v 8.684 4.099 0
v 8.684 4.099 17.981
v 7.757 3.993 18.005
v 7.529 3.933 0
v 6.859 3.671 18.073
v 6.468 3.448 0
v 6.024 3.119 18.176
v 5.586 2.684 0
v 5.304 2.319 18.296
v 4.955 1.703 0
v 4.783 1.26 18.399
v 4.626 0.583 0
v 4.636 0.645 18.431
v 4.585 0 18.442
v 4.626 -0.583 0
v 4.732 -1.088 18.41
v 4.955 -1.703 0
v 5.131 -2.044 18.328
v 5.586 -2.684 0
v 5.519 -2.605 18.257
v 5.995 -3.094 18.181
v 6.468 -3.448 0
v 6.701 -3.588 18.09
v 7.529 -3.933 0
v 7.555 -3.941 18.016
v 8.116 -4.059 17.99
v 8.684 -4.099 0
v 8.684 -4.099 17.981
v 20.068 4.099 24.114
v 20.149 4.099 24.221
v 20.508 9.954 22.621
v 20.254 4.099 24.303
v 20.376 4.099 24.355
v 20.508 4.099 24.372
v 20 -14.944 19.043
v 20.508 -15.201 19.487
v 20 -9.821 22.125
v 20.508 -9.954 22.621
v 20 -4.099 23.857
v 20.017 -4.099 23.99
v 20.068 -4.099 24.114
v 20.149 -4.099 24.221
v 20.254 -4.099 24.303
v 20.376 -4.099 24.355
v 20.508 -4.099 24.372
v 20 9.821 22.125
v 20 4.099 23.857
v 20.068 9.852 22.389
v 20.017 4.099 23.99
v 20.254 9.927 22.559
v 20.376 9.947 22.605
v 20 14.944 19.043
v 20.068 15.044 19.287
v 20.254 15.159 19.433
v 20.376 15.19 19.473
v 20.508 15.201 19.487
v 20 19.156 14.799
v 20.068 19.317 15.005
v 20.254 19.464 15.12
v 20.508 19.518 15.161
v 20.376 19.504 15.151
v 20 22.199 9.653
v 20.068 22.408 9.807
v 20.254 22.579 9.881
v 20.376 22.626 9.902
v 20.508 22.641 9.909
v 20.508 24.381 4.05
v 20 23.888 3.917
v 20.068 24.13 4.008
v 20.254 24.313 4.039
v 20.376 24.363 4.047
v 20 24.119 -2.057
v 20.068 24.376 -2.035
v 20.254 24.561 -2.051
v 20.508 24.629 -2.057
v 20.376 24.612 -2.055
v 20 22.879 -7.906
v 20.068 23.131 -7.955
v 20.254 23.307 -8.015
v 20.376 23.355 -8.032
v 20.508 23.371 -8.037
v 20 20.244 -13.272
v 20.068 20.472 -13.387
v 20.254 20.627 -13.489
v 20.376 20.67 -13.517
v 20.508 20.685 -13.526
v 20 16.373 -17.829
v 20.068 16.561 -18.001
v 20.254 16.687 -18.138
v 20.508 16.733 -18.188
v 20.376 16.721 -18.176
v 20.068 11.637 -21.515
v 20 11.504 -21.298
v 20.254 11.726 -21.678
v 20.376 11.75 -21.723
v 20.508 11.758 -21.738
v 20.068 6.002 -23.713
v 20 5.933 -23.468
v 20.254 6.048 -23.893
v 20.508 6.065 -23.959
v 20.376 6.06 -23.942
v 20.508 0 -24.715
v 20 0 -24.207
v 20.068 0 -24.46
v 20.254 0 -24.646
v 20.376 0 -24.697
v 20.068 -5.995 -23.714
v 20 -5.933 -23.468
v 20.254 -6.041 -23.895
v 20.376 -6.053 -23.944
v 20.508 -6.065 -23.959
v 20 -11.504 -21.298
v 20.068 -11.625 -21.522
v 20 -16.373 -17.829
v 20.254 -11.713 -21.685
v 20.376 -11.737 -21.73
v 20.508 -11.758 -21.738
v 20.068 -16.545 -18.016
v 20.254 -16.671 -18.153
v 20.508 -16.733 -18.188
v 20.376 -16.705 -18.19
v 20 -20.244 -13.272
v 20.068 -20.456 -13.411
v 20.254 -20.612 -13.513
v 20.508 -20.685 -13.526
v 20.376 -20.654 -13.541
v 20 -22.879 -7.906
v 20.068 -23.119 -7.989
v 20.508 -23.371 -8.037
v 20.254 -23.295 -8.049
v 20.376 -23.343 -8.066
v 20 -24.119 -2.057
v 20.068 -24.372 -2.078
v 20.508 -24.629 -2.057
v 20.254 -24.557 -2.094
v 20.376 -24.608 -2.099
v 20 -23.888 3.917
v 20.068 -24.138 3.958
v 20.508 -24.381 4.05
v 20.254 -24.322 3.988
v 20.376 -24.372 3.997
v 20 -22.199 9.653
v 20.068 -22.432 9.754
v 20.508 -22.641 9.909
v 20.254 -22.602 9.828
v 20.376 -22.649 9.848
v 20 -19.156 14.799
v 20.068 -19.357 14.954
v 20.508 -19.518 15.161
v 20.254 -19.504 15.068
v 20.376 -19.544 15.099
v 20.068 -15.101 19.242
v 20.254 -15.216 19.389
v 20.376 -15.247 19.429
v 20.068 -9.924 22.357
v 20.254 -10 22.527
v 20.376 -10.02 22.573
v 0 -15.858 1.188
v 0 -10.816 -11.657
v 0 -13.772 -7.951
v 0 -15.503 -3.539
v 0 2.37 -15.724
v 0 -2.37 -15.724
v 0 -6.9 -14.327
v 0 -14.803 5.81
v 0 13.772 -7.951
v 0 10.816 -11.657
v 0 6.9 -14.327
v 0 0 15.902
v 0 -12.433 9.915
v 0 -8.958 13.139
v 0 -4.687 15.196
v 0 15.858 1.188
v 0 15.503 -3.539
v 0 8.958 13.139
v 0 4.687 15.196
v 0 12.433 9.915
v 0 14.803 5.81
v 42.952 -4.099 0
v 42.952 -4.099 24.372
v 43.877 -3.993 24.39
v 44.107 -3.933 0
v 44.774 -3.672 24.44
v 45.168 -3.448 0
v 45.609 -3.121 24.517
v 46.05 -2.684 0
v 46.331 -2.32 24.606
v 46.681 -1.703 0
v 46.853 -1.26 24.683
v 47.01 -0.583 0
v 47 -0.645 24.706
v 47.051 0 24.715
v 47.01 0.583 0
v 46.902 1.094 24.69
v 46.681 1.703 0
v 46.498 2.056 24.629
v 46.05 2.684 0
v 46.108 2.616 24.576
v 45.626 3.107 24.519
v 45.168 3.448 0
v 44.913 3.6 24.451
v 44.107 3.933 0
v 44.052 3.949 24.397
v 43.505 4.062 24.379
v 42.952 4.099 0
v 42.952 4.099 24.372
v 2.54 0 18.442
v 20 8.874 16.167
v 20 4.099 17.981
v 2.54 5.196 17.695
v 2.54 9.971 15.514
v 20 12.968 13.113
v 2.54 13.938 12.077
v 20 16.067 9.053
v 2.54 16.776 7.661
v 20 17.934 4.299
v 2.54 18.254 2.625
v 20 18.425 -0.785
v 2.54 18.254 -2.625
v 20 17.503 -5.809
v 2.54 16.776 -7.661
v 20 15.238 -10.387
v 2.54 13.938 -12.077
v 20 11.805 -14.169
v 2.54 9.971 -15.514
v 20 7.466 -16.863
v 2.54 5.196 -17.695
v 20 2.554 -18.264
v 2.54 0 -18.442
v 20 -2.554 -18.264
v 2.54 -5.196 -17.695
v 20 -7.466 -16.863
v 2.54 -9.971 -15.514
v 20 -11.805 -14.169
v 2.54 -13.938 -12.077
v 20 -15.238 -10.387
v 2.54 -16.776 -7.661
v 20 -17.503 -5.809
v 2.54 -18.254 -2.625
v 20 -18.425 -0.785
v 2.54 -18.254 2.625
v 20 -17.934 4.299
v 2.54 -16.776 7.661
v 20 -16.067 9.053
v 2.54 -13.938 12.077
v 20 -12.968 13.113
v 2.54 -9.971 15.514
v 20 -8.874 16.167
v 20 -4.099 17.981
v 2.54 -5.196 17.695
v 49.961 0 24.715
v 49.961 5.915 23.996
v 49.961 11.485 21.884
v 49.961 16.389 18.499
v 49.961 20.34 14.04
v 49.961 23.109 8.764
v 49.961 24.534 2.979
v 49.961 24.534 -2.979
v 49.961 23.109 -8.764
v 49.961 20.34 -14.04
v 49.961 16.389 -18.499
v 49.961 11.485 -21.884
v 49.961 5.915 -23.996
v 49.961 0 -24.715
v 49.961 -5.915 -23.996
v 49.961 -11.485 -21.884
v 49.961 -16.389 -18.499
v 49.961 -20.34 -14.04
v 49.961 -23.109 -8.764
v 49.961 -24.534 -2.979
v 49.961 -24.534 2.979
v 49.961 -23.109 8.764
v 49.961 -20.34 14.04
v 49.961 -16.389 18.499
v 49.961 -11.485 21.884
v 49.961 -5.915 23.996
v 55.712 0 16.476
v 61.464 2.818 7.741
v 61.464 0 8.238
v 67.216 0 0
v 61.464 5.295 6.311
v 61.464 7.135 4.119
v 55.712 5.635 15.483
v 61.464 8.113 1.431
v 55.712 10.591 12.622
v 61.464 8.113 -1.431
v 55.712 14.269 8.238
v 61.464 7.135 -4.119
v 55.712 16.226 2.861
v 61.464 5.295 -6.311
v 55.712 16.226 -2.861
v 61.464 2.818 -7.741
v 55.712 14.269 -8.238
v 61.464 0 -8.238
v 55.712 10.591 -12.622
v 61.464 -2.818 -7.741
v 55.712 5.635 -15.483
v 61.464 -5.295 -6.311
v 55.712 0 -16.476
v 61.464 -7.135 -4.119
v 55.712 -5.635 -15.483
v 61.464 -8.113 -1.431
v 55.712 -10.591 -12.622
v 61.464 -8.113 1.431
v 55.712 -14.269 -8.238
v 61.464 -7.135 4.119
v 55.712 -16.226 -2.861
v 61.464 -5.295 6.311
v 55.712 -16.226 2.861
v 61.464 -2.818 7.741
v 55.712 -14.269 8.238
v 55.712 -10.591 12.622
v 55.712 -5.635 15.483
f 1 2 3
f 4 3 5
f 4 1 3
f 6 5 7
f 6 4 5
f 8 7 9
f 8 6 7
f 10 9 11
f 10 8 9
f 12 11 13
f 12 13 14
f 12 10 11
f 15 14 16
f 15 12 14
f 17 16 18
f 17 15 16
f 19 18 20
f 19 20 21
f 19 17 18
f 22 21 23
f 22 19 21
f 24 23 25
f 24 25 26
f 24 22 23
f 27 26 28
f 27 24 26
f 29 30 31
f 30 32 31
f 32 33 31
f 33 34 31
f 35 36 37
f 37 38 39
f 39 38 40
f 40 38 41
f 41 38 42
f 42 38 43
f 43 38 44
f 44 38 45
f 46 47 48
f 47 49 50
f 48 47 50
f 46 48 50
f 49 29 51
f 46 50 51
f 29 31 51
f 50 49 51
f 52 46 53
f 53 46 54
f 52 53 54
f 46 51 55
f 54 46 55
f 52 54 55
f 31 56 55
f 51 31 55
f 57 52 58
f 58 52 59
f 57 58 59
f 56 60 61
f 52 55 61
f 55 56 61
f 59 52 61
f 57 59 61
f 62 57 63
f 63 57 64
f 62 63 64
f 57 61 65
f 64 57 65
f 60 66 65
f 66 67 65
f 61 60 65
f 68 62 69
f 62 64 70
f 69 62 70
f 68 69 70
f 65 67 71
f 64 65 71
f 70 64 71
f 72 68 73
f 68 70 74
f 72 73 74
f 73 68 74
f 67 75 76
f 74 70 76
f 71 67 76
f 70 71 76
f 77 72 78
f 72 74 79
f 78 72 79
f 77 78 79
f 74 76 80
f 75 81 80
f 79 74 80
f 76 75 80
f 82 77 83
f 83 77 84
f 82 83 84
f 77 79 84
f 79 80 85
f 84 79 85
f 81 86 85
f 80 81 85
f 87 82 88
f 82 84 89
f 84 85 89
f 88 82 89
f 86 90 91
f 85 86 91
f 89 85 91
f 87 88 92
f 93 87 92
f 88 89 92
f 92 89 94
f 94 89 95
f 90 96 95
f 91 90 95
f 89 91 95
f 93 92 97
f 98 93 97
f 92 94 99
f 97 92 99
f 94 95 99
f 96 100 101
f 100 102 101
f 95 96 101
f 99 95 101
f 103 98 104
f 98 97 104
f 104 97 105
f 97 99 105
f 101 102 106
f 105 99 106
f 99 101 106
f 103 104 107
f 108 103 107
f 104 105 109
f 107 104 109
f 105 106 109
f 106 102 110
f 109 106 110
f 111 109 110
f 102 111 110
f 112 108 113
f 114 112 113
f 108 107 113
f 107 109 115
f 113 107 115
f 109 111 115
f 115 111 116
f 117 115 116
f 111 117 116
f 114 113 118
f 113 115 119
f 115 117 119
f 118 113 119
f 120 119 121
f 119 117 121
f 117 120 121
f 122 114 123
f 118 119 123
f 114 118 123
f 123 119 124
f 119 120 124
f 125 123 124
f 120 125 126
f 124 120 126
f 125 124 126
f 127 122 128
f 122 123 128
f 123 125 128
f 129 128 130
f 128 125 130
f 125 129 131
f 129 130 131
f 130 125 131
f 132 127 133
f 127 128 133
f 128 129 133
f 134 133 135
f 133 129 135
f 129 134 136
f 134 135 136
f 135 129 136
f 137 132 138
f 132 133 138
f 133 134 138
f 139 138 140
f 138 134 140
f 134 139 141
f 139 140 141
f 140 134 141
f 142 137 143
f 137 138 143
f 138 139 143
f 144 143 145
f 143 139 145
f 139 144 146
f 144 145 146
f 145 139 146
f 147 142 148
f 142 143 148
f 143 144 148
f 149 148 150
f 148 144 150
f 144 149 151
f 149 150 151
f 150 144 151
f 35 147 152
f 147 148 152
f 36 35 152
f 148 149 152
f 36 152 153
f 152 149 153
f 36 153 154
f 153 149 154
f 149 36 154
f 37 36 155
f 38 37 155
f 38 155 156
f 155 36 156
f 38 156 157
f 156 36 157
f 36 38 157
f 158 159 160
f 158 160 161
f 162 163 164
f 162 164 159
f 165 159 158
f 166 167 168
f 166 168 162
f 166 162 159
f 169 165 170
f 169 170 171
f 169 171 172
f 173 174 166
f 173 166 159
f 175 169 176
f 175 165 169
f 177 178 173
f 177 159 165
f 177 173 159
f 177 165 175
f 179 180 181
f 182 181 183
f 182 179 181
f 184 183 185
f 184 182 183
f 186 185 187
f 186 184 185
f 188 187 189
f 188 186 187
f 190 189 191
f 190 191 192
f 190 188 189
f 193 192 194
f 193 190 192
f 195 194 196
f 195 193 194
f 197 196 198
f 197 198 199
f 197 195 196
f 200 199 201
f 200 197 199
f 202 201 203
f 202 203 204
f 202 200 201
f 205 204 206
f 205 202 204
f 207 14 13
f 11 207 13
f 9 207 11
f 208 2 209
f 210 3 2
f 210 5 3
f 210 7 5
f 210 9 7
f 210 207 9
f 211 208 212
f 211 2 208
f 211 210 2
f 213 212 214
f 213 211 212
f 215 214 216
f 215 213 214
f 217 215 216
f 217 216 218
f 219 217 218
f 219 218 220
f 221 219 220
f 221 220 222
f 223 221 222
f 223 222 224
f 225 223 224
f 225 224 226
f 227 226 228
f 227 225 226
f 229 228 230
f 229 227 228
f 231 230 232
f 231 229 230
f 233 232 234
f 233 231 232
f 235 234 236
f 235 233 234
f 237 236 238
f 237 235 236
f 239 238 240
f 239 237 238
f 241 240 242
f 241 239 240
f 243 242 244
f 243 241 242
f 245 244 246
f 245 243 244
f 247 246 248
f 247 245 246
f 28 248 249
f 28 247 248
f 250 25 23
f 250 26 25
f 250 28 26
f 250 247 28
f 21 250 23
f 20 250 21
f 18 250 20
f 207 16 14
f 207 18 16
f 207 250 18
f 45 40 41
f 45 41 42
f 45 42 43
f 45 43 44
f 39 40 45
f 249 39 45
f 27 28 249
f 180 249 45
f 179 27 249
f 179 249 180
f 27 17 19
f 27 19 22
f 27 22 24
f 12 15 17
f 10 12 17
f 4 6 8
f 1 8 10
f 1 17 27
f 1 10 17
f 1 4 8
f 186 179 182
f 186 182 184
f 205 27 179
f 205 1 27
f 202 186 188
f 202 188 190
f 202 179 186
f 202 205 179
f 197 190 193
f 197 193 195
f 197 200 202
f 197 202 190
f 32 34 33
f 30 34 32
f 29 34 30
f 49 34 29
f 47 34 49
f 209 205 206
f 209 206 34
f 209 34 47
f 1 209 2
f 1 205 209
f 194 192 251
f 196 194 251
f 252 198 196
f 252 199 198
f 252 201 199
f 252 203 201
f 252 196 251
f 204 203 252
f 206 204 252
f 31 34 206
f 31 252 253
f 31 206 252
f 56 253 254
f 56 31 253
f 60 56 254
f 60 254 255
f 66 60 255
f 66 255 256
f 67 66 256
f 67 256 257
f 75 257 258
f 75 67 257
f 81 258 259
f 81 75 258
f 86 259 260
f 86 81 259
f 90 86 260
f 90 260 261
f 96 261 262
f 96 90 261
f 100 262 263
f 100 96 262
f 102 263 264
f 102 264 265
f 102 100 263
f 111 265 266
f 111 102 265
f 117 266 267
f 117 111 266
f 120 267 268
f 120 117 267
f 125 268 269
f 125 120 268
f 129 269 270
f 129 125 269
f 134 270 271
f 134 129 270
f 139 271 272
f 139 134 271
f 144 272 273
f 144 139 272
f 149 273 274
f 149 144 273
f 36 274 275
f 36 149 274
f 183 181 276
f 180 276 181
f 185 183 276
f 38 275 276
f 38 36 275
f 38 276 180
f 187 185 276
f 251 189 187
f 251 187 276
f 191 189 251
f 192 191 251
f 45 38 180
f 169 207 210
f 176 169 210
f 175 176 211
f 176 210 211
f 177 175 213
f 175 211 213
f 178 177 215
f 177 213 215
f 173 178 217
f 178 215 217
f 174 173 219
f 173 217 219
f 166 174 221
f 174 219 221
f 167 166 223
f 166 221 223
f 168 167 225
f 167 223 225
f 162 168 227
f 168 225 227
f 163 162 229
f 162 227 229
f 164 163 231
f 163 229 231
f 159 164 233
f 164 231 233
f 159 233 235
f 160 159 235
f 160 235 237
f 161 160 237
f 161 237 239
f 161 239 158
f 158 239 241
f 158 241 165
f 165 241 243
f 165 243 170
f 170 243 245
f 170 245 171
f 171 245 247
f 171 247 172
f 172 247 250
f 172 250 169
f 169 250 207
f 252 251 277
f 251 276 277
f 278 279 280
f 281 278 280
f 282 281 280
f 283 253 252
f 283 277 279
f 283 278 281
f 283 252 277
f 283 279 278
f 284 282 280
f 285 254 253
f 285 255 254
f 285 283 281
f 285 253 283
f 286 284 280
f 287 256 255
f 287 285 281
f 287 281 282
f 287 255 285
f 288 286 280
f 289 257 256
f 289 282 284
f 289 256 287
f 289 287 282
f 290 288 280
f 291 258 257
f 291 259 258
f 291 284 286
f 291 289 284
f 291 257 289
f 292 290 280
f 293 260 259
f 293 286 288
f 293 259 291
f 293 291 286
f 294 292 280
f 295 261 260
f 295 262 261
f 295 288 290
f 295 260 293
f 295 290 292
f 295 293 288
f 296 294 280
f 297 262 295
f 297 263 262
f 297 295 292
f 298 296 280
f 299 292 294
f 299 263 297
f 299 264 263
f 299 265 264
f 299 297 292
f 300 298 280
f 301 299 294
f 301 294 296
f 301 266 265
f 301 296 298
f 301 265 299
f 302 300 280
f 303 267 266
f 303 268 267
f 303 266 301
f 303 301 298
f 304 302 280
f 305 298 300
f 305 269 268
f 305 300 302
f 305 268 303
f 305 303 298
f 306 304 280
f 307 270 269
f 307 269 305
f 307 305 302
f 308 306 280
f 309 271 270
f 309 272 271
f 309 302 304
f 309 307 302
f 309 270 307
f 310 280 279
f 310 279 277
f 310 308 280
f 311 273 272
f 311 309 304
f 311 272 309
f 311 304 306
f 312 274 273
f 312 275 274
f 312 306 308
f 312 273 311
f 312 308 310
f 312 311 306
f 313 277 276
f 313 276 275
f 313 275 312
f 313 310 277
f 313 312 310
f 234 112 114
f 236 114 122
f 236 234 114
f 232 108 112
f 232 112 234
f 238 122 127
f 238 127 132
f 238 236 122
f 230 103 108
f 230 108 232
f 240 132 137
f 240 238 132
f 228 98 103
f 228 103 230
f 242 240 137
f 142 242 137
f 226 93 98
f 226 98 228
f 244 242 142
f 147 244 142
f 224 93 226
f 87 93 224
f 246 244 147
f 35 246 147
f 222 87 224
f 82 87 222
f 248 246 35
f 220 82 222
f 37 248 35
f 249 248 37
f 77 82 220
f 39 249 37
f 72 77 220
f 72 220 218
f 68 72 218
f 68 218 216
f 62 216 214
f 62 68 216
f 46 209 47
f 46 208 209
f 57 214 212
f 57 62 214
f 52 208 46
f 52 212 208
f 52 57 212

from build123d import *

# Parameters (mm, degrees)
F3_DEPTH = 25.4
F4_SIZE  = 2.54
F5_R     = 0.508


with BuildPart() as f1:
    # F0 (on Front) → F1 (revolve)
    with BuildSketch(Plane.XZ):
        Polygon((0, 18.442093), (0, 0), (67.2157, 0), (49.960807, 24.714644), (20, 24.714644), (20, 18.442093), align=None)
    revolve(axis=Axis((33.60785, 0, 0), (-1, 0, 0)))

    # F2 (on Top) → F3 (cut)
    with BuildSketch(Plane.XY):
        with BuildLine():
            Line((42.952237, 4.098997), (8.683674, 4.098997))
            ThreePointArc((8.683674, 4.098997), (4.584677, 0), (8.683674, -4.098997))
            Line((8.683674, -4.098997), (42.952237, -4.098997))
            ThreePointArc((42.952237, -4.098997), (47.051235, 0), (42.952237, 4.098997))
        make_face()
    extrude(amount=F3_DEPTH, mode=Mode.SUBTRACT)

    # F4
    f4_edges = [f1.edges().sort_by_distance(p)[0] for p in [
        (0, 0, -18.442093),
    ]]
    chamfer(f4_edges, length=F4_SIZE)

    # F5
    f5_edges = [f1.edges().sort_by_distance(p)[0] for p in [
        (20, 0, -24.714644),
    ]]
    fillet(f5_edges, radius=F5_R)


solid = f1.part
